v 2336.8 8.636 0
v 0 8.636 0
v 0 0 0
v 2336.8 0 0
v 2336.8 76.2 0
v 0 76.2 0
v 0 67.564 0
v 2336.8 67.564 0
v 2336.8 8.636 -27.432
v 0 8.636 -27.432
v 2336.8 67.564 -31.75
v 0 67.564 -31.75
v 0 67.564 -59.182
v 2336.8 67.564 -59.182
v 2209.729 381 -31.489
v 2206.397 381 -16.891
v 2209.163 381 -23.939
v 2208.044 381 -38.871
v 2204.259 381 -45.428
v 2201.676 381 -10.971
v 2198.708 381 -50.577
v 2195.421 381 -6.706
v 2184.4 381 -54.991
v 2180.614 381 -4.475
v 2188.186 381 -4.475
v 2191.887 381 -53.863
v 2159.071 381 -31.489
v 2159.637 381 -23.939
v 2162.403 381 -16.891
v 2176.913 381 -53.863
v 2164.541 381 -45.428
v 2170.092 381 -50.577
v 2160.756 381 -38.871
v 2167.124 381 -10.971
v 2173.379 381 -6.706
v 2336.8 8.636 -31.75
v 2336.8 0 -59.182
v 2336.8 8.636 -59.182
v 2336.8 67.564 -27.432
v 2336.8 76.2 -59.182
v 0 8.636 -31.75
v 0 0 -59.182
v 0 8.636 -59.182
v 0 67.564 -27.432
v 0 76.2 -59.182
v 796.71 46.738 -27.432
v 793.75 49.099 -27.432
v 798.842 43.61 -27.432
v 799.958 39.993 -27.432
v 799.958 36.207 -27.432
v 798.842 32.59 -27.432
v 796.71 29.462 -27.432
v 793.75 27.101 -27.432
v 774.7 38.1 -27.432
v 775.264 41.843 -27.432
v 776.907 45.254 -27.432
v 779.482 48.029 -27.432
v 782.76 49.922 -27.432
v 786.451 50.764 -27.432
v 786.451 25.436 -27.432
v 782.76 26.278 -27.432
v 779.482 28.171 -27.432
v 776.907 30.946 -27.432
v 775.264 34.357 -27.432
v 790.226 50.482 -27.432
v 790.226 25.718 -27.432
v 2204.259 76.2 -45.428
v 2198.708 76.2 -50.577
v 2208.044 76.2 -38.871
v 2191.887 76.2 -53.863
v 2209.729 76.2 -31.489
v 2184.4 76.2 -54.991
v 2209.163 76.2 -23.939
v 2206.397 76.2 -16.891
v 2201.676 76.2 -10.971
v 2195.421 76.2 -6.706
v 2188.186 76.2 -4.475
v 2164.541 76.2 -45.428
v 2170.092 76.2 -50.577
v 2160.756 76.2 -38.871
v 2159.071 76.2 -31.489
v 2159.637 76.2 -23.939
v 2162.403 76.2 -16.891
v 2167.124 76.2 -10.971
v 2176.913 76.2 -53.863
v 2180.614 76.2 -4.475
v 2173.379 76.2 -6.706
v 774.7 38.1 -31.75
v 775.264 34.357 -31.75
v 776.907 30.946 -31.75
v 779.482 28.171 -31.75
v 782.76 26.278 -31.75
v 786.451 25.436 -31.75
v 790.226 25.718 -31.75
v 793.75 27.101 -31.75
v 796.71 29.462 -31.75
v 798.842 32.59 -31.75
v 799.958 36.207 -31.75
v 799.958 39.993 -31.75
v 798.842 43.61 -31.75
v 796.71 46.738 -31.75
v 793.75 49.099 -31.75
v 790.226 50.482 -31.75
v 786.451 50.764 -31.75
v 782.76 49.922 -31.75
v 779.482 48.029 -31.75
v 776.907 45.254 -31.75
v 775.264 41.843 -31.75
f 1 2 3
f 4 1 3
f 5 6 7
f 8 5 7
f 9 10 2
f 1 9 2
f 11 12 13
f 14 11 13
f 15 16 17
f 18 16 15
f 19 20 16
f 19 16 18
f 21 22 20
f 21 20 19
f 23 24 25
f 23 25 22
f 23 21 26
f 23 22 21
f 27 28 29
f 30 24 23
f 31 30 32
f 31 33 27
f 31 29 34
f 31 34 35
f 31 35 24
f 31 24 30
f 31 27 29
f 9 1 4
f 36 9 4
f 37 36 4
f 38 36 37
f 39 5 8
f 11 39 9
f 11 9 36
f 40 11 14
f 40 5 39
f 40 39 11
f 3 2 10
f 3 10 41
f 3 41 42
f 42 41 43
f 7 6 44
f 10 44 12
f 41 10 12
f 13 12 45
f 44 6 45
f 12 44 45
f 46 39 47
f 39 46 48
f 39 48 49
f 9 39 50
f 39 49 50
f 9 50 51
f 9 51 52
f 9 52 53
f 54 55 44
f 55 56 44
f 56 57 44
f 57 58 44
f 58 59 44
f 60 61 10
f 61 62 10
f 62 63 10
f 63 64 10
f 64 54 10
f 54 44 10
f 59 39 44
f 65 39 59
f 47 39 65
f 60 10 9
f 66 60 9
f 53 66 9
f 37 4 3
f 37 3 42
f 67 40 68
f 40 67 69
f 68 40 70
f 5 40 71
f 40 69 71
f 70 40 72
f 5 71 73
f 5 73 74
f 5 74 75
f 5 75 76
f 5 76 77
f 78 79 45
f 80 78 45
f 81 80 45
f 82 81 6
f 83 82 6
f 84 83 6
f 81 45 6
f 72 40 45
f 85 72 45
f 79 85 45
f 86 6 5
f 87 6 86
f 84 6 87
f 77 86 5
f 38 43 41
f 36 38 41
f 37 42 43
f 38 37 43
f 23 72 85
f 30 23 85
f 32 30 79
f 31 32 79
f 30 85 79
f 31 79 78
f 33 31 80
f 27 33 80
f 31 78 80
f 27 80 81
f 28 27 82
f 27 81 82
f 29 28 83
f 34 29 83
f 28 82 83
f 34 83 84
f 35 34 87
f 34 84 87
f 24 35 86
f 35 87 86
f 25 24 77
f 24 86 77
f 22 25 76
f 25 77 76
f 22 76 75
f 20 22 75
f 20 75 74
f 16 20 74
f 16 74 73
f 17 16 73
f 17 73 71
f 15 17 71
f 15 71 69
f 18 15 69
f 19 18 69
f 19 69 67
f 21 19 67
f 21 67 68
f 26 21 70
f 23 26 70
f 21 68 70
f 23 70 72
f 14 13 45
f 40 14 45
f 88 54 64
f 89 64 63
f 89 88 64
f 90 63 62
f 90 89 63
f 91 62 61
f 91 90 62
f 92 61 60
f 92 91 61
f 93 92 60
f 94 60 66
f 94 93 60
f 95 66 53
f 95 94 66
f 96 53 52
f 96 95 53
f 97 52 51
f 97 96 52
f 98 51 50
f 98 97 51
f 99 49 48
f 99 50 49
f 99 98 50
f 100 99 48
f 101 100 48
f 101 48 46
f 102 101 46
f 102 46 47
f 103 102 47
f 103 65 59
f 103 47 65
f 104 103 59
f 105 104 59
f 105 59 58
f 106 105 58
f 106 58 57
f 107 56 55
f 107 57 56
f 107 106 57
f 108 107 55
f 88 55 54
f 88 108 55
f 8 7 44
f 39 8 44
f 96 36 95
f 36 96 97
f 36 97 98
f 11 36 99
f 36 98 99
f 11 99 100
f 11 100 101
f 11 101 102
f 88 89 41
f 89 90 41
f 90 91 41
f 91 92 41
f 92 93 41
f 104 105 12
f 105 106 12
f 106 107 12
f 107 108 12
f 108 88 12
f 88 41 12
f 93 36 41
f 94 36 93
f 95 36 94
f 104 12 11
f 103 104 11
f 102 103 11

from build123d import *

# Parameters (mm, degrees)
BOSS_EXTRUDE1_DEPTH = 2336.8
SKETCH3_R           = 25.4
BOSS_EXTRUDE2_DEPTH = 304.8
SKETCH4_R           = 12.7
CUT_EXTRUDE2_DEPTH  = 16.51


with BuildPart() as part:
    # Sketch1 → Boss-Extrude1 (new body)
    with BuildSketch(Plane(origin=(0, 0, 0), x_dir=(0, 0, -1), z_dir=(1, 0, 0))):
        Polygon((59.182, 67.564), (59.182, 76.2), (0, 76.2), (0, 67.564), (27.432, 67.564), (27.432, 8.636), (0, 8.636), (0, 0), (59.182, 0), (59.182, 8.636), (31.75, 8.636), (31.75, 67.564), align=None)
    extrude(amount=BOSS_EXTRUDE1_DEPTH)

    # Sketch3 → Boss-Extrude2 (add)
    with BuildSketch(Plane(origin=(0, 76.2, 0), x_dir=(1, 0, 0), z_dir=(0, 1, 0))):
        with Locations(Location((2184.4, 29.591, 0), (0, 0, 90))):
            Circle(SKETCH3_R)
    extrude(amount=BOSS_EXTRUDE2_DEPTH)

    # Sketch4 → Cut-Extrude2 (cut)
    with BuildSketch(Plane.XY.offset(-31.75)):
        with Locations(Location((787.4, 38.1, 0), (0, 0, 180))):
            Circle(SKETCH4_R)
    extrude(amount=CUT_EXTRUDE2_DEPTH, mode=Mode.SUBTRACT)


solid = part.part
